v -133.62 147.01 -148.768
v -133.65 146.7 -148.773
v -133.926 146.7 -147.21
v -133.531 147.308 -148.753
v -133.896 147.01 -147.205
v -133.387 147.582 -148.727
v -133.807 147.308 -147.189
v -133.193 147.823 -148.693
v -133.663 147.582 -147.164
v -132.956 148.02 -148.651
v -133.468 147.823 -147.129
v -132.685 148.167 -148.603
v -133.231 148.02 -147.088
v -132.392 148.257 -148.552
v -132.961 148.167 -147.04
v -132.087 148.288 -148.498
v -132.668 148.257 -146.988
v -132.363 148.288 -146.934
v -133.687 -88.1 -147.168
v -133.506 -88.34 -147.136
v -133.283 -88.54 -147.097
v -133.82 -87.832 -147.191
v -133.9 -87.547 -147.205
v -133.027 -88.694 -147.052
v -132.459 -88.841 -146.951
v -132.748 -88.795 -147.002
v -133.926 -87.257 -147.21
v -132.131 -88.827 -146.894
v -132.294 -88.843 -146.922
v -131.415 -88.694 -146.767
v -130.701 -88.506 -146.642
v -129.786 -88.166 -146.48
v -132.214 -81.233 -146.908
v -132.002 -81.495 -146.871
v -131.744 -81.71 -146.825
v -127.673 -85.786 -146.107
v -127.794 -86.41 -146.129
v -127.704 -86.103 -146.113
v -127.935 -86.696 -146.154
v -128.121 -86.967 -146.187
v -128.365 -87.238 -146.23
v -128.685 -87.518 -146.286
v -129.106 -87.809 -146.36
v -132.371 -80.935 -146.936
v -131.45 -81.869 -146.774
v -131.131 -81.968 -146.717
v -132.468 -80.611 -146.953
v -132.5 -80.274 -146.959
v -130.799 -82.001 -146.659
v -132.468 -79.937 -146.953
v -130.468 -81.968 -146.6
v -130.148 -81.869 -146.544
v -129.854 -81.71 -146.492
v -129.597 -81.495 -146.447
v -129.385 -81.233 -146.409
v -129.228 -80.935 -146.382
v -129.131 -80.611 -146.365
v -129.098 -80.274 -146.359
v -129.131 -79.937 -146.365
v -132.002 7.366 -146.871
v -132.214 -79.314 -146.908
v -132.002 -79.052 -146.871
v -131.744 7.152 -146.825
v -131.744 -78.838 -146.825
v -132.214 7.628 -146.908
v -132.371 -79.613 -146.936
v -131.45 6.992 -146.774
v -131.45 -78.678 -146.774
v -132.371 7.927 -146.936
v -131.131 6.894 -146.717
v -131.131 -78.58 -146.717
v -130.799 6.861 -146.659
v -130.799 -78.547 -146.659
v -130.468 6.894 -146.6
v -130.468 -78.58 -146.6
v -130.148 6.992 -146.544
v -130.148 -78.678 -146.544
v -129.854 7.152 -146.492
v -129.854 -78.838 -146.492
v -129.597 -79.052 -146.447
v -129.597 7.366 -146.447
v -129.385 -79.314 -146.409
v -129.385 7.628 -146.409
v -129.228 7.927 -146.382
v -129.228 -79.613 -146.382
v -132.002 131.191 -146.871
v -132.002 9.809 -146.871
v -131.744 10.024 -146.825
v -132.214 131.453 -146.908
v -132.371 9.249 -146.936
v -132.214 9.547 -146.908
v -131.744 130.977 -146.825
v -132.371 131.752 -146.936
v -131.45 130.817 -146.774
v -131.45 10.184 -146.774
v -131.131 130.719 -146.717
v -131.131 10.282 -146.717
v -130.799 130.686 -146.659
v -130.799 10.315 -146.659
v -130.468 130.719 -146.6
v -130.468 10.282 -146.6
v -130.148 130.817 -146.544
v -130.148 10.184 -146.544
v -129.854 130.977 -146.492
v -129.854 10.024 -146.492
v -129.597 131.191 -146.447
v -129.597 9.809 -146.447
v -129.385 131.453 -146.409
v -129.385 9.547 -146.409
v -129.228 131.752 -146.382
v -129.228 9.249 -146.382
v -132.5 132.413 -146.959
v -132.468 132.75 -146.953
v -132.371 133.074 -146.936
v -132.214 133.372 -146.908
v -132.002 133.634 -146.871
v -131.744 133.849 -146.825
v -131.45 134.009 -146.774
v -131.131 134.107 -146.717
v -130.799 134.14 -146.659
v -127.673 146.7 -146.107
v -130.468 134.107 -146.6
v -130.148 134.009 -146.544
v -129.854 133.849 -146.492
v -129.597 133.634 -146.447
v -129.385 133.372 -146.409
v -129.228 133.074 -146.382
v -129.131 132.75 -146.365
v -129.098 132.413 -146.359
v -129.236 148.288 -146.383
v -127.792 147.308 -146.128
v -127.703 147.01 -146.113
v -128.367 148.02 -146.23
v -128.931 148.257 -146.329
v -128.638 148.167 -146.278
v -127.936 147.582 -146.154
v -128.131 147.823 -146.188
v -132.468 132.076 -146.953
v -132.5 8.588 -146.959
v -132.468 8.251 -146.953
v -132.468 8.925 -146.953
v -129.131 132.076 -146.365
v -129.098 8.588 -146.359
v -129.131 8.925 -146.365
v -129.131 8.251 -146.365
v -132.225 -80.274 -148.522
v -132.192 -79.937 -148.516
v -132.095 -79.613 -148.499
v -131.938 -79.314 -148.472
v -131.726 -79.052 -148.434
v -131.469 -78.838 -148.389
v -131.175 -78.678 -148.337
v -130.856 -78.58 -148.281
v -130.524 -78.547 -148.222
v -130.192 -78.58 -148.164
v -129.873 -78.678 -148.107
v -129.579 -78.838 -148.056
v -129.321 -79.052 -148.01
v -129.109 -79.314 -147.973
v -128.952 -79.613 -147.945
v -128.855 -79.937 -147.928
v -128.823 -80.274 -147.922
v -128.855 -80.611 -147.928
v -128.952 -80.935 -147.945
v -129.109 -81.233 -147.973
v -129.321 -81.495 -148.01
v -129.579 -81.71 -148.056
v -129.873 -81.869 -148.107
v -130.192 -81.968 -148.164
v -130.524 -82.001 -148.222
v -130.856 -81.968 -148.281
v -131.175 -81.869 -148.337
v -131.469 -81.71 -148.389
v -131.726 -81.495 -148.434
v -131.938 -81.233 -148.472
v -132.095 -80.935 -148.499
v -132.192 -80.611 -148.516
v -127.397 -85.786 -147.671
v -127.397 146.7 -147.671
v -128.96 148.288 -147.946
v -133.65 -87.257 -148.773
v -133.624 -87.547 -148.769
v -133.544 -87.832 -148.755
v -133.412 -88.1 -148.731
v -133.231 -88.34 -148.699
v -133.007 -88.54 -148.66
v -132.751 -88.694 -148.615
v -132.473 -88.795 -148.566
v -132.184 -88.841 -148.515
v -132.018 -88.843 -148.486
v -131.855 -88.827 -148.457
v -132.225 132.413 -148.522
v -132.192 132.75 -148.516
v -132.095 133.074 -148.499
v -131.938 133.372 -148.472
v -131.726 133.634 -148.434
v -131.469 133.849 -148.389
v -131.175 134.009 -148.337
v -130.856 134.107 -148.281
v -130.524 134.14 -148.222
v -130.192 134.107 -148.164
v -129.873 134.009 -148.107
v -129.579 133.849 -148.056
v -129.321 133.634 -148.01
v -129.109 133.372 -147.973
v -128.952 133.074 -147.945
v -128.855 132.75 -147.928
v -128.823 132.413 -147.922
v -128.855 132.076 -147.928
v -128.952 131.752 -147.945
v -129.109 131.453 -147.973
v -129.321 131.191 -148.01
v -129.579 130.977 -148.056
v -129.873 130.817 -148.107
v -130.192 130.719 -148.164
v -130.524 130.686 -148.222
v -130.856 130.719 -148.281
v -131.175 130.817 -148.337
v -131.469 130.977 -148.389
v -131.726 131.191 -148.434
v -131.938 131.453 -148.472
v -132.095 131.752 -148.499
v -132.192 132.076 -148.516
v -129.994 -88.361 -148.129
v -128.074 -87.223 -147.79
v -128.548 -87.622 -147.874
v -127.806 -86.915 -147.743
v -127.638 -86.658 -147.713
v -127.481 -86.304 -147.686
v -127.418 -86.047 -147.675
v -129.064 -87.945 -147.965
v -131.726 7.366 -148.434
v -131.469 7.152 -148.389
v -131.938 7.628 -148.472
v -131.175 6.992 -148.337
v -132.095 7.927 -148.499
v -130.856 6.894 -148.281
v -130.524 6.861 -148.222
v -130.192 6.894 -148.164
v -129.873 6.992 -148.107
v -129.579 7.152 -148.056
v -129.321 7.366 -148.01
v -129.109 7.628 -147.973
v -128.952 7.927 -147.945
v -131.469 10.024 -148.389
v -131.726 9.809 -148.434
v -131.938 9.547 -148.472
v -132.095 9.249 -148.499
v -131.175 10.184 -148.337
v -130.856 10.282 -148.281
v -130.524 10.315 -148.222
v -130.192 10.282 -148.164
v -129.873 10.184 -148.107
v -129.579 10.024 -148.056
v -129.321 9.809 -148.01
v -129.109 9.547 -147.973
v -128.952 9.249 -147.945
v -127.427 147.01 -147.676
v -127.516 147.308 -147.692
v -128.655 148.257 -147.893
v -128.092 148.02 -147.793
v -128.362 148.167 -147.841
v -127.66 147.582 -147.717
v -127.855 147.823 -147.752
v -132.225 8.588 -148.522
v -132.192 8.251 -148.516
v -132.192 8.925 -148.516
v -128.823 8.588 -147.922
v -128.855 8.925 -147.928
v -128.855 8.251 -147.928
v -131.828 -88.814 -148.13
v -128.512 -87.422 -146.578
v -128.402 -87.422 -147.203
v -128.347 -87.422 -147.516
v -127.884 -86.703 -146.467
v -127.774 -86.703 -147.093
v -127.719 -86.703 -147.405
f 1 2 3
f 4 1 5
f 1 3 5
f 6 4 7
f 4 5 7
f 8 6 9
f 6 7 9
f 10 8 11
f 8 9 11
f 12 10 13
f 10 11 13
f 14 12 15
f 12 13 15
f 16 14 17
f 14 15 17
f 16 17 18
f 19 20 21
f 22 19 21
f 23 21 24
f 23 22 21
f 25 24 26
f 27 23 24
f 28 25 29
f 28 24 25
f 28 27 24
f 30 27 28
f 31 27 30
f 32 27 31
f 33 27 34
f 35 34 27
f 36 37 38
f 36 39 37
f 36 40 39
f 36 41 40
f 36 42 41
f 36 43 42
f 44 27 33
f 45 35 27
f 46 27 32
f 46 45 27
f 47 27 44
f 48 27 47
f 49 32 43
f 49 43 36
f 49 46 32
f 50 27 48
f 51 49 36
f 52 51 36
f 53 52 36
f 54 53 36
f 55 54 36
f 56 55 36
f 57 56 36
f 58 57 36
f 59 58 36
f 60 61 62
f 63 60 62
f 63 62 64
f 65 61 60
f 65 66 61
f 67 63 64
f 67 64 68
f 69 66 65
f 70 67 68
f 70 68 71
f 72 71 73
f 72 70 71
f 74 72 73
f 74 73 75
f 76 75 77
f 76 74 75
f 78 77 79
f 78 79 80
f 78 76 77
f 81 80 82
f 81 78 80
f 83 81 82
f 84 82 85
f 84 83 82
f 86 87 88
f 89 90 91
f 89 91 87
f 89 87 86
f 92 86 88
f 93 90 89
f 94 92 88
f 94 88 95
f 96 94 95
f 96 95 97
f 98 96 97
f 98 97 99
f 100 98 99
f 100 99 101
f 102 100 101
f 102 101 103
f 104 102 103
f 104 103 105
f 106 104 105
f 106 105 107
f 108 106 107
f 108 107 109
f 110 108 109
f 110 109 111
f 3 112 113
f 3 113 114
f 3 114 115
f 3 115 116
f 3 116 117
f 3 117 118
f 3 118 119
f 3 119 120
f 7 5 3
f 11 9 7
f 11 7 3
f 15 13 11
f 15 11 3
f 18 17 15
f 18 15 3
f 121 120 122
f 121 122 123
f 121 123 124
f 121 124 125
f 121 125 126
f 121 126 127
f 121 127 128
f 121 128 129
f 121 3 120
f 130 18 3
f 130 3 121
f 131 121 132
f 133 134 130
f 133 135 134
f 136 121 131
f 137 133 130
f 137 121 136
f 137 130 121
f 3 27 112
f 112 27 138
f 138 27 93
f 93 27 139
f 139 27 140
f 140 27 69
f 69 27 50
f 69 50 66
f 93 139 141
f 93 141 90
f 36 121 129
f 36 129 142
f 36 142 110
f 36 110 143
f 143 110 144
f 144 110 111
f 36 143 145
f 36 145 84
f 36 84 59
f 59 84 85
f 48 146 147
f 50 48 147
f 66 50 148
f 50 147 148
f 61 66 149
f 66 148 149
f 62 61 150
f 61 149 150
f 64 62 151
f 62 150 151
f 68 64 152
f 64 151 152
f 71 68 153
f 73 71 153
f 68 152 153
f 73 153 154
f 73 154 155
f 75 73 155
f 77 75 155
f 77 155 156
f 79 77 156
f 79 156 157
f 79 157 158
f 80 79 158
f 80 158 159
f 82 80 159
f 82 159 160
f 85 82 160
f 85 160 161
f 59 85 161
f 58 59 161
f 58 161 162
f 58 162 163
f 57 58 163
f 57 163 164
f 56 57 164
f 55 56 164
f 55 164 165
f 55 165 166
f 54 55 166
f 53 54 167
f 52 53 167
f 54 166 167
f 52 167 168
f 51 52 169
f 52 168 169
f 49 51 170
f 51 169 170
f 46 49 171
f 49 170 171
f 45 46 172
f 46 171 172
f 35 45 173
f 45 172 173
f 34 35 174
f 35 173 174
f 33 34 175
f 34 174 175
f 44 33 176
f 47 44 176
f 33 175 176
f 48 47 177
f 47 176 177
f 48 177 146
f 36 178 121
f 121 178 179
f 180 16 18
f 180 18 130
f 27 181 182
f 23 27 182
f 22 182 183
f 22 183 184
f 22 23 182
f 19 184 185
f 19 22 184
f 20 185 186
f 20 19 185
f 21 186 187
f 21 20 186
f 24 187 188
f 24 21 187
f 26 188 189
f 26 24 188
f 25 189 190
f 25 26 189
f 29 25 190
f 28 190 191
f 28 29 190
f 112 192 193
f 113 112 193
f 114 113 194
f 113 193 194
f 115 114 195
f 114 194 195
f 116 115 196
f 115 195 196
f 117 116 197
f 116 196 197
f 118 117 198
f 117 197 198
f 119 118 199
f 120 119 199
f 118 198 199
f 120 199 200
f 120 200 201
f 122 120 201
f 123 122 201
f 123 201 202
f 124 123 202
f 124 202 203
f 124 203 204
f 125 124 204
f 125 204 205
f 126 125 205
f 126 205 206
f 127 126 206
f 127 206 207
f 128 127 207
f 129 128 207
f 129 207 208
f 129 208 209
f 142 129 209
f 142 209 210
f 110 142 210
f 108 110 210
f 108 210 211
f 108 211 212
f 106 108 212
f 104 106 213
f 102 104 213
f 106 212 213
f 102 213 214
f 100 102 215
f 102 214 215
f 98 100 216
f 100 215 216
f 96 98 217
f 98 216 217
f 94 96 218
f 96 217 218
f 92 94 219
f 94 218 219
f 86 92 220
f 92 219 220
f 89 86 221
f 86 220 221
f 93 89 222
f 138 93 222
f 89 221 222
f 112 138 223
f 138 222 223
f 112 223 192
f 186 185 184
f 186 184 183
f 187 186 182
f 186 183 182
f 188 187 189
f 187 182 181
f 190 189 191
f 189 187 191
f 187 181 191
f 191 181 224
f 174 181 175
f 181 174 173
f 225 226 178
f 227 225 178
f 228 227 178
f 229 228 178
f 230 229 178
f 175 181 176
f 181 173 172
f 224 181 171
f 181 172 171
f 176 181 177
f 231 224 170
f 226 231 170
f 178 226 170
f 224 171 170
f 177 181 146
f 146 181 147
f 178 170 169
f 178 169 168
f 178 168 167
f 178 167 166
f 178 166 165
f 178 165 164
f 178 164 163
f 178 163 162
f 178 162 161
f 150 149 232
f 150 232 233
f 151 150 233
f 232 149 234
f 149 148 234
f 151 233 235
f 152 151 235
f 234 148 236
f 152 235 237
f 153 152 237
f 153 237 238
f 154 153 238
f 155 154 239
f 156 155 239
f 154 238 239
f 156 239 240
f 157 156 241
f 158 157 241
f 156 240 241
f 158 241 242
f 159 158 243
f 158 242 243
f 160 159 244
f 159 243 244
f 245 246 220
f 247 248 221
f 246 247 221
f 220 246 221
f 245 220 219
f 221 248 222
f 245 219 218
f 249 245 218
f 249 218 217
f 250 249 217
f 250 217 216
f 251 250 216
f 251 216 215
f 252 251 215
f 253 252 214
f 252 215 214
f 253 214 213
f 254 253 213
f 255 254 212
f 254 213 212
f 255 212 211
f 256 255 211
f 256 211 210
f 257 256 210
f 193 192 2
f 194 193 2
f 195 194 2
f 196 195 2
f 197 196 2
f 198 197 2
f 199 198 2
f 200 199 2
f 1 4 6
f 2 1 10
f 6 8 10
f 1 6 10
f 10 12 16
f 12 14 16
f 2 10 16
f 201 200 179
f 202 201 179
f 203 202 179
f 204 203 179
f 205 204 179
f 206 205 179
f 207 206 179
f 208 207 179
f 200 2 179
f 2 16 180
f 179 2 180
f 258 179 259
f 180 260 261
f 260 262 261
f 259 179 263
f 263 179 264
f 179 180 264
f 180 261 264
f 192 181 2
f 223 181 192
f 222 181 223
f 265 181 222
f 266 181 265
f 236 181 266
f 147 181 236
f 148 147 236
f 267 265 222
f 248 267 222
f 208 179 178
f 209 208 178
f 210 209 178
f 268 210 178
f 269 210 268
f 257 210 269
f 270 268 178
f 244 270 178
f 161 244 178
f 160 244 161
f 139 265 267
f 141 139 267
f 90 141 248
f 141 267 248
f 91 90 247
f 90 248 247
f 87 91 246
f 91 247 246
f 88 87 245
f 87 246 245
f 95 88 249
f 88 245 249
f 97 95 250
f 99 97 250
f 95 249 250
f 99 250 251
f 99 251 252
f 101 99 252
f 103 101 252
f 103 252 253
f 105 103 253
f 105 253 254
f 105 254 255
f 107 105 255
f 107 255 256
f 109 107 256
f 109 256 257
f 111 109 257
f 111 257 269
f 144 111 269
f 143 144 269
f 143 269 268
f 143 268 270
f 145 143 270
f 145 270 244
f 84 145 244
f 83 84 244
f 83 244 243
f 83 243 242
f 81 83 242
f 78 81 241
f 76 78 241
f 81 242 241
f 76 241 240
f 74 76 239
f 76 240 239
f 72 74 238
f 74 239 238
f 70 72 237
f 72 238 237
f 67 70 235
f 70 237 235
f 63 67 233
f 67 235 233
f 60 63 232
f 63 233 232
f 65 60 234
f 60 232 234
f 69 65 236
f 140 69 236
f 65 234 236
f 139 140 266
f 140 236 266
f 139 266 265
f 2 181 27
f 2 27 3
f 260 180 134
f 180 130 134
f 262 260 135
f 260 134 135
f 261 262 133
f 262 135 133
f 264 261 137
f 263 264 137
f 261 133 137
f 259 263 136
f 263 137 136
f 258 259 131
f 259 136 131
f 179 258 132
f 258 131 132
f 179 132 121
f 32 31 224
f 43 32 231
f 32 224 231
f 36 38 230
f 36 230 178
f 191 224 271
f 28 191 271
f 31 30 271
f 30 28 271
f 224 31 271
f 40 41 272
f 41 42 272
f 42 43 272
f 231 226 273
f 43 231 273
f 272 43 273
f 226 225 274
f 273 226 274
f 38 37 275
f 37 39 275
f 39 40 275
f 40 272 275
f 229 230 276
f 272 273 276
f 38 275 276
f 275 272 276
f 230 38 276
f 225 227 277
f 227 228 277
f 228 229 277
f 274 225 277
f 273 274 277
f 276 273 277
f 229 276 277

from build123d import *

# Parameters (mm, degrees)
SKETCH1_W             = 6.35
SKETCH1_H             = 237.248411897
BOSS_EXTRUDE1_DEPTH   = 1.5875
CUT_EXTRUDE1_DEPTH    = 217.487166027
FILLET1_R             = 1.5875
F_4_CLEARANCE_HOLE1_D = 3.4544


with BuildPart() as part:
    # Sketch1 → Boss-Extrude1 (new body)
    with BuildSketch(Plane(origin=(23.448725568, 0, -121.072657859), x_dir=(0.9848077530122085, 0, 0.17364817766692836), z_dir=(-0.17364817766692836, 0, 0.9848077530122085))):
        with Locations((-156.347723262, 29.663605247)):
            Rectangle(SKETCH1_W, SKETCH1_H)
    extrude(amount=BOSS_EXTRUDE1_DEPTH)

    # Sketch5 → Cut-Extrude1 (cut, through all)
    with BuildSketch(Plane(origin=(21.411709489, 0, -121.431838754), x_dir=(-0.9848077530122086, 0, -0.1736481776669278), z_dir=(0.17364817766692778, 0, -0.9848077530122085))):
        with BuildLine():
            Line((157.454282927, -88.960600702), (151.104282926, -88.960600702))
            Line((151.104282926, -88.960600702), (151.104282926, -85.785600702))
            add(Edge.make_bspline(
                [(157.454282927, -88.960600702), (156.478833721, -88.960600702), (155.547731492, -88.814113606), (154.541218358, -88.655762372), (153.69021453, -88.342663916), (152.667745865, -87.966480695), (152.012488578, -87.421859718), (151.604733254, -87.082951464), (151.375343959, -86.703342636), (151.104282926, -86.254772615), (151.104282926, -85.785600702)],
                knots=[0, 0, 0, 0.25, 0.25, 0.5, 0.5, 0.75, 0.75, 0.875, 0.875, 1, 1, 1], degree=2))
        make_face()
    extrude(amount=-CUT_EXTRUDE1_DEPTH, mode=Mode.SUBTRACT)

    # Fillet1
    fillet1_edges = [part.edges().sort_by_distance(p)[0] for p in [
        (-127.534793091, 148.287811195, -146.889130968),
        (-133.788322323, 148.287811195, -147.991796896),
        (-133.788322323, -88.960600702, -147.991796896),
    ]]
    fillet(fillet1_edges, radius=FILLET1_R)

    # #4 Clearance Hole1 (through all)
    with Locations(Plane(origin=(21.136043007, 0, -119.868456446), x_dir=(0.9848077530122086, 0, 0.1736481776669278), z_dir=(-0.17364817766692778, 0, 0.9848077530122085))):
        with Locations((-154.279282926, 8.587811195), (-154.279282926, -80.273715104), (-154.279282926, 132.412811195)):
            Hole(F_4_CLEARANCE_HOLE1_D / 2)


solid = part.part
